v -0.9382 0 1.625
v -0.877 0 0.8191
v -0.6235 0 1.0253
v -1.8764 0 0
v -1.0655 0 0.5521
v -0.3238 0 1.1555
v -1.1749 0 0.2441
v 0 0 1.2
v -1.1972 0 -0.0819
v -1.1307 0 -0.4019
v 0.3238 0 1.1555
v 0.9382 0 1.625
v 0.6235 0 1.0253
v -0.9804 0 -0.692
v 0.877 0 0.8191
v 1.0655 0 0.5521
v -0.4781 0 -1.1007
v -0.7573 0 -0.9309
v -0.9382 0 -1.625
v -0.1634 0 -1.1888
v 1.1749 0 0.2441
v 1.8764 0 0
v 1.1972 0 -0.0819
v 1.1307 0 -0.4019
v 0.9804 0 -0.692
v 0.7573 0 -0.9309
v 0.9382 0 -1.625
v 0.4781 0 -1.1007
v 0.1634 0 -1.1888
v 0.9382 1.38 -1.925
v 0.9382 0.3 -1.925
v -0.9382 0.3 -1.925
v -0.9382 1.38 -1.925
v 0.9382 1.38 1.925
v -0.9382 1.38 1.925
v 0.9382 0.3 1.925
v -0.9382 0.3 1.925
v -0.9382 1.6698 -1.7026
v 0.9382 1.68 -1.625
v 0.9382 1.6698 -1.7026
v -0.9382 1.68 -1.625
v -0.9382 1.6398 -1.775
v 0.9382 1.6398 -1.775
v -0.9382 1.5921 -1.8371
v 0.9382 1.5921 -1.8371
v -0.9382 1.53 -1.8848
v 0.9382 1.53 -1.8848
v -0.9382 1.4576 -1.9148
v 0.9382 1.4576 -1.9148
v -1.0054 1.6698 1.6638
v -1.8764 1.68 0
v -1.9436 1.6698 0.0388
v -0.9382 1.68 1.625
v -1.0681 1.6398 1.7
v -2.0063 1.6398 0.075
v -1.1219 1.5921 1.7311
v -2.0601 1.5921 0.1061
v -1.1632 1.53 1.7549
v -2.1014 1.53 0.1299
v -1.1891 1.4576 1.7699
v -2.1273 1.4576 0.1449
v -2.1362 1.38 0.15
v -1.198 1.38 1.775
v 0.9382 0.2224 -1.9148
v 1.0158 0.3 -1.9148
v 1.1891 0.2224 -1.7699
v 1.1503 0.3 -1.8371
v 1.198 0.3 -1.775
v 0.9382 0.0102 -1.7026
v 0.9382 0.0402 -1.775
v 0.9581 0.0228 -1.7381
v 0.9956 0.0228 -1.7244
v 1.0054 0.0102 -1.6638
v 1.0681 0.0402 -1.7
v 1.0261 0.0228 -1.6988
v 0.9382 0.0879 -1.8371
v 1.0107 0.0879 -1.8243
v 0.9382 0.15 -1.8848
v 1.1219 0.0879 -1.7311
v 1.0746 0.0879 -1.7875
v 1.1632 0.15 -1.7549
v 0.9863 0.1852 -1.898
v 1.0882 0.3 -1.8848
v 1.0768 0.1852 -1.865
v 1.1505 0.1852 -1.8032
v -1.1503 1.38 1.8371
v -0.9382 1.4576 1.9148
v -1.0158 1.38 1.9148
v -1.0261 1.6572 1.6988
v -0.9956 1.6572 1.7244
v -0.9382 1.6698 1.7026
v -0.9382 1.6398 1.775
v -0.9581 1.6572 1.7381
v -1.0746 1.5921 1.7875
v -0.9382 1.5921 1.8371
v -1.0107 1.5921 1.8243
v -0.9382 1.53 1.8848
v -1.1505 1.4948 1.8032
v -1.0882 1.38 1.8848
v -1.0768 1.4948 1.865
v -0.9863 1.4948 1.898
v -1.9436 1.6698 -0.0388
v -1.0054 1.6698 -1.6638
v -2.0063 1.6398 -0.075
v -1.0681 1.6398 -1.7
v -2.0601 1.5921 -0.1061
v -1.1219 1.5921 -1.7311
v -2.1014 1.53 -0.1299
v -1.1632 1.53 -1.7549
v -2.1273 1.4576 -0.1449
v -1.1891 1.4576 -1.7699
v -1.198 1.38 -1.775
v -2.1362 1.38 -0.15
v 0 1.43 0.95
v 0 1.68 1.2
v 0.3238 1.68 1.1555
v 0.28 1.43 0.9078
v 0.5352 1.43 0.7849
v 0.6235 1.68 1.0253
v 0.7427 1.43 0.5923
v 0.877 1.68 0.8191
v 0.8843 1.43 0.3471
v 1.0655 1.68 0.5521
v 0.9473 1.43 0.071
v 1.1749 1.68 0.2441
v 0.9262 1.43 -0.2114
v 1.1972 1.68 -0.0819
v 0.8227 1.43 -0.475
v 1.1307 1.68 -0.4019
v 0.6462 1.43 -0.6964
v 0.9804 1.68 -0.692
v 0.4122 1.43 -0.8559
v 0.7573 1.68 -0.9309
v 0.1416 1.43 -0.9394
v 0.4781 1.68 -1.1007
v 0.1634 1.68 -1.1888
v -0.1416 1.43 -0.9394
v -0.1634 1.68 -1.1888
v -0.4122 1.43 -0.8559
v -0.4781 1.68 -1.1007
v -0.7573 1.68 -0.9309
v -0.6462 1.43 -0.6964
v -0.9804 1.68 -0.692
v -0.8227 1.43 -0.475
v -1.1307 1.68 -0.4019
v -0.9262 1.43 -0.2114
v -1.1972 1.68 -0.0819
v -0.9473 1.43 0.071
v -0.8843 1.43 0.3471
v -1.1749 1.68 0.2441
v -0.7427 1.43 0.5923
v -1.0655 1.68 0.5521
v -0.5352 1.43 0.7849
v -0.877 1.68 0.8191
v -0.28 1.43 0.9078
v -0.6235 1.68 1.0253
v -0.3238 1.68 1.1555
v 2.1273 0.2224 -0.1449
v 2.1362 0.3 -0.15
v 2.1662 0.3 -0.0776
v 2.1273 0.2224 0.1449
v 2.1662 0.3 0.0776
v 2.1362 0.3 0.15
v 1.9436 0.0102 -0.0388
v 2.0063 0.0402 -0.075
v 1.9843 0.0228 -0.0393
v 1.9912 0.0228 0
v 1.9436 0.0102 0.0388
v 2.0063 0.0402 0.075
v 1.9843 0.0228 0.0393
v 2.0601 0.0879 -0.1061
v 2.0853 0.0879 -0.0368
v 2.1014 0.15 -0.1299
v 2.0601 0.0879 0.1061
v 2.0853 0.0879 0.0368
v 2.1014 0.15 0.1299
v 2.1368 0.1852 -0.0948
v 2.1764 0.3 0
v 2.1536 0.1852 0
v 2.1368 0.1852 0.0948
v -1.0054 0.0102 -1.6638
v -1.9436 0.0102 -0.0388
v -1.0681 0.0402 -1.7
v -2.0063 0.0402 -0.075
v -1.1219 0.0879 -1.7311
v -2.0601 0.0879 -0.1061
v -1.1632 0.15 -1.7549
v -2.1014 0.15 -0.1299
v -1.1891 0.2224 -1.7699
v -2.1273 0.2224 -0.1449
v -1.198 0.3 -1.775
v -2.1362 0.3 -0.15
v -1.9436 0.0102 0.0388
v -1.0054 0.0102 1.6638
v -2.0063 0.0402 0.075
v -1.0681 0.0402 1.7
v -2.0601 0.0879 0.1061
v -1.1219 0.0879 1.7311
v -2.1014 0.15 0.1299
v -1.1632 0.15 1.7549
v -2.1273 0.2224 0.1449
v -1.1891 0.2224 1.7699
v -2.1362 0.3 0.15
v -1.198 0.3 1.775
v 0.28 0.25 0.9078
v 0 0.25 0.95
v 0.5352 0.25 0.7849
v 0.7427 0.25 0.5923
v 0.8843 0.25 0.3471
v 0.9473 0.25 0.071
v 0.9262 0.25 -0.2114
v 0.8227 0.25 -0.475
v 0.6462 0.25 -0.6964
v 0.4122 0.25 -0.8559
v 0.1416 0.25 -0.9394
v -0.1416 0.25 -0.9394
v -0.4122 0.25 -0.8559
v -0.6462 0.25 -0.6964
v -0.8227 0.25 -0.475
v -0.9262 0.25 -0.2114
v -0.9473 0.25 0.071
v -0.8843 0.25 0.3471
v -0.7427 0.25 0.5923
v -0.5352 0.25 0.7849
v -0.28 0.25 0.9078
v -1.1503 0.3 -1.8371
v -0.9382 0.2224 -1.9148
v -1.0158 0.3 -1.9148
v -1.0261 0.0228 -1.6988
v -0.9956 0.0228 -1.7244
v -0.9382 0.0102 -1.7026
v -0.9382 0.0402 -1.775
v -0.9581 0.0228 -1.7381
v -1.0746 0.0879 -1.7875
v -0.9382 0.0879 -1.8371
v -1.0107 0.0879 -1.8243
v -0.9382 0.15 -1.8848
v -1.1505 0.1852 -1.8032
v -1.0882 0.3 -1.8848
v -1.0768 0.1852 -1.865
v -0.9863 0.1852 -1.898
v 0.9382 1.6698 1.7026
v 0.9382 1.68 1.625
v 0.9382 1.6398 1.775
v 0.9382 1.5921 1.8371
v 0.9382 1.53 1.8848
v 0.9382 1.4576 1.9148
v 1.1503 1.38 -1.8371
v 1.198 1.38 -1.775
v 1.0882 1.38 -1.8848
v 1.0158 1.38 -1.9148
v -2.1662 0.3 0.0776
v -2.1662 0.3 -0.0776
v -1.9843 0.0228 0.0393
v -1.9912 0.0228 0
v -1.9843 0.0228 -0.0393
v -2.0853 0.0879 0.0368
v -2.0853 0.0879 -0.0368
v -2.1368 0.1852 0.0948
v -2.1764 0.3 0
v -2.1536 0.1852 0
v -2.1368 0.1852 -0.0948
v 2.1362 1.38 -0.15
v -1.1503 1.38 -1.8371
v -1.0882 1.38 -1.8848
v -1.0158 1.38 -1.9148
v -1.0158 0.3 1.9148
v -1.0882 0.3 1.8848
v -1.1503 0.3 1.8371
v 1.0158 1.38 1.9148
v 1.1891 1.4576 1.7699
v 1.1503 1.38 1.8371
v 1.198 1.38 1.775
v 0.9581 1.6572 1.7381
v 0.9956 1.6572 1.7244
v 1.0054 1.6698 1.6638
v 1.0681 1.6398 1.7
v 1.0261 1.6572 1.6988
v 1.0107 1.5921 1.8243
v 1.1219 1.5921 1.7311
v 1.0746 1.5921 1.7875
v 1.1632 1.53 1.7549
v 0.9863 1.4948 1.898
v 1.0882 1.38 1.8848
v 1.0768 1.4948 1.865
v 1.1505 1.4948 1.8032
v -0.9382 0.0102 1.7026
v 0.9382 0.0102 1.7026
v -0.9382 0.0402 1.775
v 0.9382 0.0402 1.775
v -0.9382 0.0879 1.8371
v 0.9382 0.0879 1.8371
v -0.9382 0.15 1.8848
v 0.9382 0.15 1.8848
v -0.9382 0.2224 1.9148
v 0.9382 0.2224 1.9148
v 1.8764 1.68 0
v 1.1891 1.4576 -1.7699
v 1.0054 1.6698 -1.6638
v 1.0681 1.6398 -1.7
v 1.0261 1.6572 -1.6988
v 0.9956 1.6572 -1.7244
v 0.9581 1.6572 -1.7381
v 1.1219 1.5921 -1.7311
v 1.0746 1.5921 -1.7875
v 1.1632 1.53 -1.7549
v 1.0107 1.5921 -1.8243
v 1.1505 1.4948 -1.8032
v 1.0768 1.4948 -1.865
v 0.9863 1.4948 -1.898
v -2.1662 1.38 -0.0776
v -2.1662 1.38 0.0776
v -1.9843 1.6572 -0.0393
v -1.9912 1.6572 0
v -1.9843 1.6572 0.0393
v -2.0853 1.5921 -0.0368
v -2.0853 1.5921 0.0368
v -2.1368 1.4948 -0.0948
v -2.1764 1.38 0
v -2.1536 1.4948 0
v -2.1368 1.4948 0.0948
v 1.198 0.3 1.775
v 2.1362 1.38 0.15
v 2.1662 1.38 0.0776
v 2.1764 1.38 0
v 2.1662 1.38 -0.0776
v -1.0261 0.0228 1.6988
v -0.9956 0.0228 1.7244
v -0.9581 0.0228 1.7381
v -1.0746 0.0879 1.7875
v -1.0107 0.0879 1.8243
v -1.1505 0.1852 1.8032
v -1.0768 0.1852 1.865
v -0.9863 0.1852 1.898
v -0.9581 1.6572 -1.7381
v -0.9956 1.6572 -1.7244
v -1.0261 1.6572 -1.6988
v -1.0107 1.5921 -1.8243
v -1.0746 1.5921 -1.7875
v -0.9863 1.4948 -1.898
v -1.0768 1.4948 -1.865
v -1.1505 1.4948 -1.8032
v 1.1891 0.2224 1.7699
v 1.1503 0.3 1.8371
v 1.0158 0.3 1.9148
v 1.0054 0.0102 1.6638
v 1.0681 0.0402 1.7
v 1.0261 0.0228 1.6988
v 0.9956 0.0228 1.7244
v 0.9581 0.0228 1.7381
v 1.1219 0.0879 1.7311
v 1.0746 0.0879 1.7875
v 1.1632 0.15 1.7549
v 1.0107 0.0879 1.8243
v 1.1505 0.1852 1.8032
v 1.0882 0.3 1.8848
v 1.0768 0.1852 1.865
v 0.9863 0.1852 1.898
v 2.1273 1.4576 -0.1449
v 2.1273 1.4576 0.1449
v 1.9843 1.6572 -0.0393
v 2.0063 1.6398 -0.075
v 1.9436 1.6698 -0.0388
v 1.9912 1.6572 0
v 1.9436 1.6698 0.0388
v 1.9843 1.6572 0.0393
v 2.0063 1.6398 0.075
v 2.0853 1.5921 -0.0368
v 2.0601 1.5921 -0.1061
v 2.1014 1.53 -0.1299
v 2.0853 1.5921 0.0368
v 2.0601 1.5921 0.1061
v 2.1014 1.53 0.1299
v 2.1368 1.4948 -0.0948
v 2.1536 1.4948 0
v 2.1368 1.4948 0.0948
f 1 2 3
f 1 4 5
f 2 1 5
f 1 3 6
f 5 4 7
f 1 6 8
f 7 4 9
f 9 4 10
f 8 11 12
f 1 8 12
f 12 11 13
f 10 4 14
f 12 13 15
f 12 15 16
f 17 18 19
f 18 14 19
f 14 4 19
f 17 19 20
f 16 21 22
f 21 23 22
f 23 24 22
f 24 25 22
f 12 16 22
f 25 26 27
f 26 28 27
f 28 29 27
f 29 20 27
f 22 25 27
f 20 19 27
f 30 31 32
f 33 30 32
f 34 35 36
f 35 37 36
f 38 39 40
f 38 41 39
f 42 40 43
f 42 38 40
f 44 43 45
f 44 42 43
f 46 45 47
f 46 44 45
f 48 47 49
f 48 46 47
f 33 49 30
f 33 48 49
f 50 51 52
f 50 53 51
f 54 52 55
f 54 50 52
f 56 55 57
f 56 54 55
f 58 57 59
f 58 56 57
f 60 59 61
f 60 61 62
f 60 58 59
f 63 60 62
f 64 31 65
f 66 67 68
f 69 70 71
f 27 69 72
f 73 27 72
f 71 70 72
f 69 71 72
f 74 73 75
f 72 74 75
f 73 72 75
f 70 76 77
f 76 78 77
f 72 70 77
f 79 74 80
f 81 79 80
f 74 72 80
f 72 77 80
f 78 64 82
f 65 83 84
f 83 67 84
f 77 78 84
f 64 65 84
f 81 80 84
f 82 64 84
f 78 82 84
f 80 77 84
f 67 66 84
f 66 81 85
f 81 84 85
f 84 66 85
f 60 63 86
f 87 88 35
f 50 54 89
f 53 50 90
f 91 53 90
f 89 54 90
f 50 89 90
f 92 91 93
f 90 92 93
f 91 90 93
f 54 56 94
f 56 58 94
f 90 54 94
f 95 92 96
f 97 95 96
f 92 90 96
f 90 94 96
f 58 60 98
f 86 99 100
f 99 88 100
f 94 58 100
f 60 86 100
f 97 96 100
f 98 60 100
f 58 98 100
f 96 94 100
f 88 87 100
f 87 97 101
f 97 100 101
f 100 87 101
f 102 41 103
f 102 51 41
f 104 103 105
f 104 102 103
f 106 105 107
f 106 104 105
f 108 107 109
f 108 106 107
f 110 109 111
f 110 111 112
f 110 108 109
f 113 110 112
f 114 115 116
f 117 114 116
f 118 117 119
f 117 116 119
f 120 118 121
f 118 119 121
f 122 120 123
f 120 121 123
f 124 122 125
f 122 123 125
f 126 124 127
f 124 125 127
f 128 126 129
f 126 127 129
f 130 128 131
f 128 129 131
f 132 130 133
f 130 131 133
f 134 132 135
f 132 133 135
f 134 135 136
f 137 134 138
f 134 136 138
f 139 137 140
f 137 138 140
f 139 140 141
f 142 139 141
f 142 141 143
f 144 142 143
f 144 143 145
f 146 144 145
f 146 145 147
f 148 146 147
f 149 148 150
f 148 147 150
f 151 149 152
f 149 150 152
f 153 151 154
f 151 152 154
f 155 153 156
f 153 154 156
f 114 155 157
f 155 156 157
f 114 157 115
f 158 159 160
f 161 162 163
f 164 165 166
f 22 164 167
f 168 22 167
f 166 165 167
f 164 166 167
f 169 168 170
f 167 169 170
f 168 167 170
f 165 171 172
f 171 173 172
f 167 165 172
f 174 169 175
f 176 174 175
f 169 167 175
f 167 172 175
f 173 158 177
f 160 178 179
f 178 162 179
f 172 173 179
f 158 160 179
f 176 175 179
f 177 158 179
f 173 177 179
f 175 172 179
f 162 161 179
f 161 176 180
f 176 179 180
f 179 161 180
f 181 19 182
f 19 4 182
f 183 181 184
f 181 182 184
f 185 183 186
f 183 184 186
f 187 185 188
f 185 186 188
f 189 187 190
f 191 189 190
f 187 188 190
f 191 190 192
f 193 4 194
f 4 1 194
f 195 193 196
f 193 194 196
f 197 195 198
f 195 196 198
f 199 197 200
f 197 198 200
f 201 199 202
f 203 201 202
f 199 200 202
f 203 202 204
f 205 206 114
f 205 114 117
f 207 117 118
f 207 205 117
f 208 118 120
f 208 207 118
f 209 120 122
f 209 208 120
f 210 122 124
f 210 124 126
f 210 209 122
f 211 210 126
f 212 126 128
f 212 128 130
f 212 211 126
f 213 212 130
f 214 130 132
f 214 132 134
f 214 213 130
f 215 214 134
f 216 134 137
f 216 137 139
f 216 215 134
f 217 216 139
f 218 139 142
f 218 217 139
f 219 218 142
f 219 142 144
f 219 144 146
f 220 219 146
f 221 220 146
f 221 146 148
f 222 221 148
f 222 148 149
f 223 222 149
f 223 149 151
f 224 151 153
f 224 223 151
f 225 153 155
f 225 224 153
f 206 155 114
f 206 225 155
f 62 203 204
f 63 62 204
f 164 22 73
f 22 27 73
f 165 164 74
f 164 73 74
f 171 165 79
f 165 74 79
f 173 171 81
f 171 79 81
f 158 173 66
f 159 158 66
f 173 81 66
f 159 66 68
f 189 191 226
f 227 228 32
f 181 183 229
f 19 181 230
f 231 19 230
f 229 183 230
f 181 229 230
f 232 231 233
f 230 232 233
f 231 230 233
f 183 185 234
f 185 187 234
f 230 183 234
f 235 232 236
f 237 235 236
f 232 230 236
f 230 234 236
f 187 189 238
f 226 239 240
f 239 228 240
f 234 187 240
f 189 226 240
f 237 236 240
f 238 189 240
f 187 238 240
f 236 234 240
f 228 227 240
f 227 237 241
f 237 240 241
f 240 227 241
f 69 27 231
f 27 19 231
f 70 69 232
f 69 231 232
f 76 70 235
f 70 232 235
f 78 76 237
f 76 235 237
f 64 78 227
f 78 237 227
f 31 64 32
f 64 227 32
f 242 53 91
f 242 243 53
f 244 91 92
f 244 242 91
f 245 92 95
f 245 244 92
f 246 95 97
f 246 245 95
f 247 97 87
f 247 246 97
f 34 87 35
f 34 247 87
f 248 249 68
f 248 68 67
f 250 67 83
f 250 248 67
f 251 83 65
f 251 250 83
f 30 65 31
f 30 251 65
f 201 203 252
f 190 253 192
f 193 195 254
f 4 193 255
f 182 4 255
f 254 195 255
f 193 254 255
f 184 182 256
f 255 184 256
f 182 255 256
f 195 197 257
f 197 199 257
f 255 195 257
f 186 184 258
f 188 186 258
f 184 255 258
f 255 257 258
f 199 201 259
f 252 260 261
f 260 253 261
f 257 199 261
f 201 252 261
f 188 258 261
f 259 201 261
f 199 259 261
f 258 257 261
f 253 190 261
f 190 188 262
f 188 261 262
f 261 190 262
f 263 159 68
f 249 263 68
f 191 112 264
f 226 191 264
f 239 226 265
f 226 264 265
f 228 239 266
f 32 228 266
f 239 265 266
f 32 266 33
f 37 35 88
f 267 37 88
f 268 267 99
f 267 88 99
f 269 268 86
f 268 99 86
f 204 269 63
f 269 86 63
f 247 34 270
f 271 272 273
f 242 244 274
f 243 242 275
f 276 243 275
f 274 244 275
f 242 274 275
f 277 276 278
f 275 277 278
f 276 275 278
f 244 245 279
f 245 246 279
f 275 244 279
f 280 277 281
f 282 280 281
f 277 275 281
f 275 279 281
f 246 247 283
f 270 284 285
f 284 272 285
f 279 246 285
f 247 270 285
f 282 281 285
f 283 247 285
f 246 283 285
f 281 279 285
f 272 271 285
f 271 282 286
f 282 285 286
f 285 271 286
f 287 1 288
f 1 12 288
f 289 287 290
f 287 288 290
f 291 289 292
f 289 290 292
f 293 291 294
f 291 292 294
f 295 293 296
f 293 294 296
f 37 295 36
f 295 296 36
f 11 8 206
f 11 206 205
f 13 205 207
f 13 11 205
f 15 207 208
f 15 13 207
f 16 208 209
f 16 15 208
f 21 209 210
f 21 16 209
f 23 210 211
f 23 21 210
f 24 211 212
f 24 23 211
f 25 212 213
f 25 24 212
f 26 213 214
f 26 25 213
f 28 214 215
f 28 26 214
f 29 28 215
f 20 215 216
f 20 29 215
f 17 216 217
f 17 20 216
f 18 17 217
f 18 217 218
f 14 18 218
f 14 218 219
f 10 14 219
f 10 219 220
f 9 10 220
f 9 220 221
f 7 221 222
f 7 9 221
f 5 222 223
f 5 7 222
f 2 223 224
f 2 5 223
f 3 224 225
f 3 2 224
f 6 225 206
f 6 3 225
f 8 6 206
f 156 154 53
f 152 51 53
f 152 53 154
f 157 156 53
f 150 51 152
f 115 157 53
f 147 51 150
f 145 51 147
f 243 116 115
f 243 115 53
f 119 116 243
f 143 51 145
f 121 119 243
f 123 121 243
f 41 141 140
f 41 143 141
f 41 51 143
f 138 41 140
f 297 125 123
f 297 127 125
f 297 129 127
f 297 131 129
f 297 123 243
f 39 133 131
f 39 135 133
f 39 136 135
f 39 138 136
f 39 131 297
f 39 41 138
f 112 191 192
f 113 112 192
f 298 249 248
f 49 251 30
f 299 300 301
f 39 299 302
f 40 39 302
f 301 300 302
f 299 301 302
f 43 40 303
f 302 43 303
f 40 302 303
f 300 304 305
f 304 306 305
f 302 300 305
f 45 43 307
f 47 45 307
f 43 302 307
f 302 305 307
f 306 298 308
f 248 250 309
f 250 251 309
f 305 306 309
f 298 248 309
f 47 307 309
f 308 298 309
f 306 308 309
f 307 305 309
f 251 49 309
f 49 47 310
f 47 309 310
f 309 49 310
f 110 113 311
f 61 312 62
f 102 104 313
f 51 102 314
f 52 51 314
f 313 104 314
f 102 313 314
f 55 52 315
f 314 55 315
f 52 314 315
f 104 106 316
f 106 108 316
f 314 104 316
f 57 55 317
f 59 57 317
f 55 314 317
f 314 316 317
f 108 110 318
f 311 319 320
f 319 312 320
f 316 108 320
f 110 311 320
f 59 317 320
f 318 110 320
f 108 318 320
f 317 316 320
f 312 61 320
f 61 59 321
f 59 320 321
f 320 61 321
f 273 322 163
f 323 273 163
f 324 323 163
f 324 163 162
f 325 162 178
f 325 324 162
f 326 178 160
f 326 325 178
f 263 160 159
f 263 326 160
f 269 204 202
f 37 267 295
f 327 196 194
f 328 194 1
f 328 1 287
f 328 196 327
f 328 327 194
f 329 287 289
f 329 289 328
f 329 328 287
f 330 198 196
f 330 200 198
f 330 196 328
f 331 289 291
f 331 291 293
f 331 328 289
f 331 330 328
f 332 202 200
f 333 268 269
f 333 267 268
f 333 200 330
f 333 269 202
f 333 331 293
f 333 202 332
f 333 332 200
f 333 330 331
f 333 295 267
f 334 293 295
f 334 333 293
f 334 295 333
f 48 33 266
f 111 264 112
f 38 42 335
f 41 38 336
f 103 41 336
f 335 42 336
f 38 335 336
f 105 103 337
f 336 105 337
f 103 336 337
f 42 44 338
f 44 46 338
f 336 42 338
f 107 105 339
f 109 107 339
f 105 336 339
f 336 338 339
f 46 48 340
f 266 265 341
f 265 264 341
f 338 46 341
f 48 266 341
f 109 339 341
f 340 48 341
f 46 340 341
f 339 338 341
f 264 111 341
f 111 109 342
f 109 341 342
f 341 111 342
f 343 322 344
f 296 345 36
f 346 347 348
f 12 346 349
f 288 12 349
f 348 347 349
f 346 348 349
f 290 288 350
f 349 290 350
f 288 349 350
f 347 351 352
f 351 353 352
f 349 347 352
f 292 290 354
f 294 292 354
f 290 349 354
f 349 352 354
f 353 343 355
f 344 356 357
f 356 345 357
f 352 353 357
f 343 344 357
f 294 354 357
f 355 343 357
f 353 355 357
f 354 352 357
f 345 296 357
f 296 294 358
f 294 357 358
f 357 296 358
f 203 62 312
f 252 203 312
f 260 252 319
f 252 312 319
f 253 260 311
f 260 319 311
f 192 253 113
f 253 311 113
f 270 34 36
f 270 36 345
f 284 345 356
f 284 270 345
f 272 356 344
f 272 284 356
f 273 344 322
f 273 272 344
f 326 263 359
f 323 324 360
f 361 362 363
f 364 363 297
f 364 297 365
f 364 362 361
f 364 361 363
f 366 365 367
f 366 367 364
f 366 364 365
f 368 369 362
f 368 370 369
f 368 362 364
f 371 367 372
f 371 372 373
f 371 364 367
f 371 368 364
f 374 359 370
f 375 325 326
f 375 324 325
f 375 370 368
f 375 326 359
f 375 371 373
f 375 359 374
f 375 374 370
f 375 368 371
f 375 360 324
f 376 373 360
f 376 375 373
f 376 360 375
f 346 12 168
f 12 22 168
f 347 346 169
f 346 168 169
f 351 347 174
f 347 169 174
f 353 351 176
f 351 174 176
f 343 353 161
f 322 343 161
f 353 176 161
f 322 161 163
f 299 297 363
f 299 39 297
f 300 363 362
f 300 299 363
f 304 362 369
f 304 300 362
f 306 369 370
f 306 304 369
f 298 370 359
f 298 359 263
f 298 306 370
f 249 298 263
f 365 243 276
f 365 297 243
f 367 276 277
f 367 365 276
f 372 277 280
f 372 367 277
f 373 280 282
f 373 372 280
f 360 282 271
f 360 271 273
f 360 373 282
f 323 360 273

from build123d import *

# Parameters (mm, degrees)
SKETCH1_R           = 0.95
BOSS_EXTRUDE1_DEPTH = 1.68
CHAMFER2_SIZE       = 0.25
FILLET1_R           = 0.3


with BuildPart() as part:
    # Sketch1 → Boss-Extrude1 (new body)
    with BuildSketch(Plane(origin=(0, 0, 0), x_dir=(1, 0, 0), z_dir=(0, 1, 0))):
        Polygon((1.111399268, -1.925), (2.222798536, 0), (1.111399268, 1.925), (-1.111399268, 1.925), (-2.222798536, 0), (-1.111399268, -1.925), align=None)
        Circle(SKETCH1_R, mode=Mode.SUBTRACT)
    extrude(amount=BOSS_EXTRUDE1_DEPTH)

    # Chamfer2
    chamfer2_edges = [part.edges().sort_by_distance(p)[0] for p in [
        (-0.95, 1.68, 0),
        (-0.95, 0, 0),
    ]]
    chamfer(chamfer2_edges, length=CHAMFER2_SIZE)

    # Fillet1
    fillet1_edges = [part.edges().sort_by_distance(p)[0] for p in [
        (1.667098902, 1.68, -0.9625),
        (1.667098902, 0, -0.9625),
        (1.111399268, 0.84, -1.925),
        (0, 1.68, -1.925),
        (0, 0, -1.925),
        (-1.111399268, 0.84, -1.925),
        (-1.667098902, 1.68, -0.9625),
        (-1.667098902, 0, -0.9625),
        (-2.222798536, 0.84, 0),
        (-1.667098902, 1.68, 0.9625),
        (-1.667098902, 0, 0.9625),
        (-1.111399268, 0.84, 1.925),
        (0, 1.68, 1.925),
        (0, 0, 1.925),
        (1.111399268, 0.84, 1.925),
        (1.667098902, 1.68, 0.9625),
        (2.222798536, 0.84, 0),
        (1.667098902, 0, 0.9625),
    ]]
    fillet(fillet1_edges, radius=FILLET1_R)


solid = part.part
